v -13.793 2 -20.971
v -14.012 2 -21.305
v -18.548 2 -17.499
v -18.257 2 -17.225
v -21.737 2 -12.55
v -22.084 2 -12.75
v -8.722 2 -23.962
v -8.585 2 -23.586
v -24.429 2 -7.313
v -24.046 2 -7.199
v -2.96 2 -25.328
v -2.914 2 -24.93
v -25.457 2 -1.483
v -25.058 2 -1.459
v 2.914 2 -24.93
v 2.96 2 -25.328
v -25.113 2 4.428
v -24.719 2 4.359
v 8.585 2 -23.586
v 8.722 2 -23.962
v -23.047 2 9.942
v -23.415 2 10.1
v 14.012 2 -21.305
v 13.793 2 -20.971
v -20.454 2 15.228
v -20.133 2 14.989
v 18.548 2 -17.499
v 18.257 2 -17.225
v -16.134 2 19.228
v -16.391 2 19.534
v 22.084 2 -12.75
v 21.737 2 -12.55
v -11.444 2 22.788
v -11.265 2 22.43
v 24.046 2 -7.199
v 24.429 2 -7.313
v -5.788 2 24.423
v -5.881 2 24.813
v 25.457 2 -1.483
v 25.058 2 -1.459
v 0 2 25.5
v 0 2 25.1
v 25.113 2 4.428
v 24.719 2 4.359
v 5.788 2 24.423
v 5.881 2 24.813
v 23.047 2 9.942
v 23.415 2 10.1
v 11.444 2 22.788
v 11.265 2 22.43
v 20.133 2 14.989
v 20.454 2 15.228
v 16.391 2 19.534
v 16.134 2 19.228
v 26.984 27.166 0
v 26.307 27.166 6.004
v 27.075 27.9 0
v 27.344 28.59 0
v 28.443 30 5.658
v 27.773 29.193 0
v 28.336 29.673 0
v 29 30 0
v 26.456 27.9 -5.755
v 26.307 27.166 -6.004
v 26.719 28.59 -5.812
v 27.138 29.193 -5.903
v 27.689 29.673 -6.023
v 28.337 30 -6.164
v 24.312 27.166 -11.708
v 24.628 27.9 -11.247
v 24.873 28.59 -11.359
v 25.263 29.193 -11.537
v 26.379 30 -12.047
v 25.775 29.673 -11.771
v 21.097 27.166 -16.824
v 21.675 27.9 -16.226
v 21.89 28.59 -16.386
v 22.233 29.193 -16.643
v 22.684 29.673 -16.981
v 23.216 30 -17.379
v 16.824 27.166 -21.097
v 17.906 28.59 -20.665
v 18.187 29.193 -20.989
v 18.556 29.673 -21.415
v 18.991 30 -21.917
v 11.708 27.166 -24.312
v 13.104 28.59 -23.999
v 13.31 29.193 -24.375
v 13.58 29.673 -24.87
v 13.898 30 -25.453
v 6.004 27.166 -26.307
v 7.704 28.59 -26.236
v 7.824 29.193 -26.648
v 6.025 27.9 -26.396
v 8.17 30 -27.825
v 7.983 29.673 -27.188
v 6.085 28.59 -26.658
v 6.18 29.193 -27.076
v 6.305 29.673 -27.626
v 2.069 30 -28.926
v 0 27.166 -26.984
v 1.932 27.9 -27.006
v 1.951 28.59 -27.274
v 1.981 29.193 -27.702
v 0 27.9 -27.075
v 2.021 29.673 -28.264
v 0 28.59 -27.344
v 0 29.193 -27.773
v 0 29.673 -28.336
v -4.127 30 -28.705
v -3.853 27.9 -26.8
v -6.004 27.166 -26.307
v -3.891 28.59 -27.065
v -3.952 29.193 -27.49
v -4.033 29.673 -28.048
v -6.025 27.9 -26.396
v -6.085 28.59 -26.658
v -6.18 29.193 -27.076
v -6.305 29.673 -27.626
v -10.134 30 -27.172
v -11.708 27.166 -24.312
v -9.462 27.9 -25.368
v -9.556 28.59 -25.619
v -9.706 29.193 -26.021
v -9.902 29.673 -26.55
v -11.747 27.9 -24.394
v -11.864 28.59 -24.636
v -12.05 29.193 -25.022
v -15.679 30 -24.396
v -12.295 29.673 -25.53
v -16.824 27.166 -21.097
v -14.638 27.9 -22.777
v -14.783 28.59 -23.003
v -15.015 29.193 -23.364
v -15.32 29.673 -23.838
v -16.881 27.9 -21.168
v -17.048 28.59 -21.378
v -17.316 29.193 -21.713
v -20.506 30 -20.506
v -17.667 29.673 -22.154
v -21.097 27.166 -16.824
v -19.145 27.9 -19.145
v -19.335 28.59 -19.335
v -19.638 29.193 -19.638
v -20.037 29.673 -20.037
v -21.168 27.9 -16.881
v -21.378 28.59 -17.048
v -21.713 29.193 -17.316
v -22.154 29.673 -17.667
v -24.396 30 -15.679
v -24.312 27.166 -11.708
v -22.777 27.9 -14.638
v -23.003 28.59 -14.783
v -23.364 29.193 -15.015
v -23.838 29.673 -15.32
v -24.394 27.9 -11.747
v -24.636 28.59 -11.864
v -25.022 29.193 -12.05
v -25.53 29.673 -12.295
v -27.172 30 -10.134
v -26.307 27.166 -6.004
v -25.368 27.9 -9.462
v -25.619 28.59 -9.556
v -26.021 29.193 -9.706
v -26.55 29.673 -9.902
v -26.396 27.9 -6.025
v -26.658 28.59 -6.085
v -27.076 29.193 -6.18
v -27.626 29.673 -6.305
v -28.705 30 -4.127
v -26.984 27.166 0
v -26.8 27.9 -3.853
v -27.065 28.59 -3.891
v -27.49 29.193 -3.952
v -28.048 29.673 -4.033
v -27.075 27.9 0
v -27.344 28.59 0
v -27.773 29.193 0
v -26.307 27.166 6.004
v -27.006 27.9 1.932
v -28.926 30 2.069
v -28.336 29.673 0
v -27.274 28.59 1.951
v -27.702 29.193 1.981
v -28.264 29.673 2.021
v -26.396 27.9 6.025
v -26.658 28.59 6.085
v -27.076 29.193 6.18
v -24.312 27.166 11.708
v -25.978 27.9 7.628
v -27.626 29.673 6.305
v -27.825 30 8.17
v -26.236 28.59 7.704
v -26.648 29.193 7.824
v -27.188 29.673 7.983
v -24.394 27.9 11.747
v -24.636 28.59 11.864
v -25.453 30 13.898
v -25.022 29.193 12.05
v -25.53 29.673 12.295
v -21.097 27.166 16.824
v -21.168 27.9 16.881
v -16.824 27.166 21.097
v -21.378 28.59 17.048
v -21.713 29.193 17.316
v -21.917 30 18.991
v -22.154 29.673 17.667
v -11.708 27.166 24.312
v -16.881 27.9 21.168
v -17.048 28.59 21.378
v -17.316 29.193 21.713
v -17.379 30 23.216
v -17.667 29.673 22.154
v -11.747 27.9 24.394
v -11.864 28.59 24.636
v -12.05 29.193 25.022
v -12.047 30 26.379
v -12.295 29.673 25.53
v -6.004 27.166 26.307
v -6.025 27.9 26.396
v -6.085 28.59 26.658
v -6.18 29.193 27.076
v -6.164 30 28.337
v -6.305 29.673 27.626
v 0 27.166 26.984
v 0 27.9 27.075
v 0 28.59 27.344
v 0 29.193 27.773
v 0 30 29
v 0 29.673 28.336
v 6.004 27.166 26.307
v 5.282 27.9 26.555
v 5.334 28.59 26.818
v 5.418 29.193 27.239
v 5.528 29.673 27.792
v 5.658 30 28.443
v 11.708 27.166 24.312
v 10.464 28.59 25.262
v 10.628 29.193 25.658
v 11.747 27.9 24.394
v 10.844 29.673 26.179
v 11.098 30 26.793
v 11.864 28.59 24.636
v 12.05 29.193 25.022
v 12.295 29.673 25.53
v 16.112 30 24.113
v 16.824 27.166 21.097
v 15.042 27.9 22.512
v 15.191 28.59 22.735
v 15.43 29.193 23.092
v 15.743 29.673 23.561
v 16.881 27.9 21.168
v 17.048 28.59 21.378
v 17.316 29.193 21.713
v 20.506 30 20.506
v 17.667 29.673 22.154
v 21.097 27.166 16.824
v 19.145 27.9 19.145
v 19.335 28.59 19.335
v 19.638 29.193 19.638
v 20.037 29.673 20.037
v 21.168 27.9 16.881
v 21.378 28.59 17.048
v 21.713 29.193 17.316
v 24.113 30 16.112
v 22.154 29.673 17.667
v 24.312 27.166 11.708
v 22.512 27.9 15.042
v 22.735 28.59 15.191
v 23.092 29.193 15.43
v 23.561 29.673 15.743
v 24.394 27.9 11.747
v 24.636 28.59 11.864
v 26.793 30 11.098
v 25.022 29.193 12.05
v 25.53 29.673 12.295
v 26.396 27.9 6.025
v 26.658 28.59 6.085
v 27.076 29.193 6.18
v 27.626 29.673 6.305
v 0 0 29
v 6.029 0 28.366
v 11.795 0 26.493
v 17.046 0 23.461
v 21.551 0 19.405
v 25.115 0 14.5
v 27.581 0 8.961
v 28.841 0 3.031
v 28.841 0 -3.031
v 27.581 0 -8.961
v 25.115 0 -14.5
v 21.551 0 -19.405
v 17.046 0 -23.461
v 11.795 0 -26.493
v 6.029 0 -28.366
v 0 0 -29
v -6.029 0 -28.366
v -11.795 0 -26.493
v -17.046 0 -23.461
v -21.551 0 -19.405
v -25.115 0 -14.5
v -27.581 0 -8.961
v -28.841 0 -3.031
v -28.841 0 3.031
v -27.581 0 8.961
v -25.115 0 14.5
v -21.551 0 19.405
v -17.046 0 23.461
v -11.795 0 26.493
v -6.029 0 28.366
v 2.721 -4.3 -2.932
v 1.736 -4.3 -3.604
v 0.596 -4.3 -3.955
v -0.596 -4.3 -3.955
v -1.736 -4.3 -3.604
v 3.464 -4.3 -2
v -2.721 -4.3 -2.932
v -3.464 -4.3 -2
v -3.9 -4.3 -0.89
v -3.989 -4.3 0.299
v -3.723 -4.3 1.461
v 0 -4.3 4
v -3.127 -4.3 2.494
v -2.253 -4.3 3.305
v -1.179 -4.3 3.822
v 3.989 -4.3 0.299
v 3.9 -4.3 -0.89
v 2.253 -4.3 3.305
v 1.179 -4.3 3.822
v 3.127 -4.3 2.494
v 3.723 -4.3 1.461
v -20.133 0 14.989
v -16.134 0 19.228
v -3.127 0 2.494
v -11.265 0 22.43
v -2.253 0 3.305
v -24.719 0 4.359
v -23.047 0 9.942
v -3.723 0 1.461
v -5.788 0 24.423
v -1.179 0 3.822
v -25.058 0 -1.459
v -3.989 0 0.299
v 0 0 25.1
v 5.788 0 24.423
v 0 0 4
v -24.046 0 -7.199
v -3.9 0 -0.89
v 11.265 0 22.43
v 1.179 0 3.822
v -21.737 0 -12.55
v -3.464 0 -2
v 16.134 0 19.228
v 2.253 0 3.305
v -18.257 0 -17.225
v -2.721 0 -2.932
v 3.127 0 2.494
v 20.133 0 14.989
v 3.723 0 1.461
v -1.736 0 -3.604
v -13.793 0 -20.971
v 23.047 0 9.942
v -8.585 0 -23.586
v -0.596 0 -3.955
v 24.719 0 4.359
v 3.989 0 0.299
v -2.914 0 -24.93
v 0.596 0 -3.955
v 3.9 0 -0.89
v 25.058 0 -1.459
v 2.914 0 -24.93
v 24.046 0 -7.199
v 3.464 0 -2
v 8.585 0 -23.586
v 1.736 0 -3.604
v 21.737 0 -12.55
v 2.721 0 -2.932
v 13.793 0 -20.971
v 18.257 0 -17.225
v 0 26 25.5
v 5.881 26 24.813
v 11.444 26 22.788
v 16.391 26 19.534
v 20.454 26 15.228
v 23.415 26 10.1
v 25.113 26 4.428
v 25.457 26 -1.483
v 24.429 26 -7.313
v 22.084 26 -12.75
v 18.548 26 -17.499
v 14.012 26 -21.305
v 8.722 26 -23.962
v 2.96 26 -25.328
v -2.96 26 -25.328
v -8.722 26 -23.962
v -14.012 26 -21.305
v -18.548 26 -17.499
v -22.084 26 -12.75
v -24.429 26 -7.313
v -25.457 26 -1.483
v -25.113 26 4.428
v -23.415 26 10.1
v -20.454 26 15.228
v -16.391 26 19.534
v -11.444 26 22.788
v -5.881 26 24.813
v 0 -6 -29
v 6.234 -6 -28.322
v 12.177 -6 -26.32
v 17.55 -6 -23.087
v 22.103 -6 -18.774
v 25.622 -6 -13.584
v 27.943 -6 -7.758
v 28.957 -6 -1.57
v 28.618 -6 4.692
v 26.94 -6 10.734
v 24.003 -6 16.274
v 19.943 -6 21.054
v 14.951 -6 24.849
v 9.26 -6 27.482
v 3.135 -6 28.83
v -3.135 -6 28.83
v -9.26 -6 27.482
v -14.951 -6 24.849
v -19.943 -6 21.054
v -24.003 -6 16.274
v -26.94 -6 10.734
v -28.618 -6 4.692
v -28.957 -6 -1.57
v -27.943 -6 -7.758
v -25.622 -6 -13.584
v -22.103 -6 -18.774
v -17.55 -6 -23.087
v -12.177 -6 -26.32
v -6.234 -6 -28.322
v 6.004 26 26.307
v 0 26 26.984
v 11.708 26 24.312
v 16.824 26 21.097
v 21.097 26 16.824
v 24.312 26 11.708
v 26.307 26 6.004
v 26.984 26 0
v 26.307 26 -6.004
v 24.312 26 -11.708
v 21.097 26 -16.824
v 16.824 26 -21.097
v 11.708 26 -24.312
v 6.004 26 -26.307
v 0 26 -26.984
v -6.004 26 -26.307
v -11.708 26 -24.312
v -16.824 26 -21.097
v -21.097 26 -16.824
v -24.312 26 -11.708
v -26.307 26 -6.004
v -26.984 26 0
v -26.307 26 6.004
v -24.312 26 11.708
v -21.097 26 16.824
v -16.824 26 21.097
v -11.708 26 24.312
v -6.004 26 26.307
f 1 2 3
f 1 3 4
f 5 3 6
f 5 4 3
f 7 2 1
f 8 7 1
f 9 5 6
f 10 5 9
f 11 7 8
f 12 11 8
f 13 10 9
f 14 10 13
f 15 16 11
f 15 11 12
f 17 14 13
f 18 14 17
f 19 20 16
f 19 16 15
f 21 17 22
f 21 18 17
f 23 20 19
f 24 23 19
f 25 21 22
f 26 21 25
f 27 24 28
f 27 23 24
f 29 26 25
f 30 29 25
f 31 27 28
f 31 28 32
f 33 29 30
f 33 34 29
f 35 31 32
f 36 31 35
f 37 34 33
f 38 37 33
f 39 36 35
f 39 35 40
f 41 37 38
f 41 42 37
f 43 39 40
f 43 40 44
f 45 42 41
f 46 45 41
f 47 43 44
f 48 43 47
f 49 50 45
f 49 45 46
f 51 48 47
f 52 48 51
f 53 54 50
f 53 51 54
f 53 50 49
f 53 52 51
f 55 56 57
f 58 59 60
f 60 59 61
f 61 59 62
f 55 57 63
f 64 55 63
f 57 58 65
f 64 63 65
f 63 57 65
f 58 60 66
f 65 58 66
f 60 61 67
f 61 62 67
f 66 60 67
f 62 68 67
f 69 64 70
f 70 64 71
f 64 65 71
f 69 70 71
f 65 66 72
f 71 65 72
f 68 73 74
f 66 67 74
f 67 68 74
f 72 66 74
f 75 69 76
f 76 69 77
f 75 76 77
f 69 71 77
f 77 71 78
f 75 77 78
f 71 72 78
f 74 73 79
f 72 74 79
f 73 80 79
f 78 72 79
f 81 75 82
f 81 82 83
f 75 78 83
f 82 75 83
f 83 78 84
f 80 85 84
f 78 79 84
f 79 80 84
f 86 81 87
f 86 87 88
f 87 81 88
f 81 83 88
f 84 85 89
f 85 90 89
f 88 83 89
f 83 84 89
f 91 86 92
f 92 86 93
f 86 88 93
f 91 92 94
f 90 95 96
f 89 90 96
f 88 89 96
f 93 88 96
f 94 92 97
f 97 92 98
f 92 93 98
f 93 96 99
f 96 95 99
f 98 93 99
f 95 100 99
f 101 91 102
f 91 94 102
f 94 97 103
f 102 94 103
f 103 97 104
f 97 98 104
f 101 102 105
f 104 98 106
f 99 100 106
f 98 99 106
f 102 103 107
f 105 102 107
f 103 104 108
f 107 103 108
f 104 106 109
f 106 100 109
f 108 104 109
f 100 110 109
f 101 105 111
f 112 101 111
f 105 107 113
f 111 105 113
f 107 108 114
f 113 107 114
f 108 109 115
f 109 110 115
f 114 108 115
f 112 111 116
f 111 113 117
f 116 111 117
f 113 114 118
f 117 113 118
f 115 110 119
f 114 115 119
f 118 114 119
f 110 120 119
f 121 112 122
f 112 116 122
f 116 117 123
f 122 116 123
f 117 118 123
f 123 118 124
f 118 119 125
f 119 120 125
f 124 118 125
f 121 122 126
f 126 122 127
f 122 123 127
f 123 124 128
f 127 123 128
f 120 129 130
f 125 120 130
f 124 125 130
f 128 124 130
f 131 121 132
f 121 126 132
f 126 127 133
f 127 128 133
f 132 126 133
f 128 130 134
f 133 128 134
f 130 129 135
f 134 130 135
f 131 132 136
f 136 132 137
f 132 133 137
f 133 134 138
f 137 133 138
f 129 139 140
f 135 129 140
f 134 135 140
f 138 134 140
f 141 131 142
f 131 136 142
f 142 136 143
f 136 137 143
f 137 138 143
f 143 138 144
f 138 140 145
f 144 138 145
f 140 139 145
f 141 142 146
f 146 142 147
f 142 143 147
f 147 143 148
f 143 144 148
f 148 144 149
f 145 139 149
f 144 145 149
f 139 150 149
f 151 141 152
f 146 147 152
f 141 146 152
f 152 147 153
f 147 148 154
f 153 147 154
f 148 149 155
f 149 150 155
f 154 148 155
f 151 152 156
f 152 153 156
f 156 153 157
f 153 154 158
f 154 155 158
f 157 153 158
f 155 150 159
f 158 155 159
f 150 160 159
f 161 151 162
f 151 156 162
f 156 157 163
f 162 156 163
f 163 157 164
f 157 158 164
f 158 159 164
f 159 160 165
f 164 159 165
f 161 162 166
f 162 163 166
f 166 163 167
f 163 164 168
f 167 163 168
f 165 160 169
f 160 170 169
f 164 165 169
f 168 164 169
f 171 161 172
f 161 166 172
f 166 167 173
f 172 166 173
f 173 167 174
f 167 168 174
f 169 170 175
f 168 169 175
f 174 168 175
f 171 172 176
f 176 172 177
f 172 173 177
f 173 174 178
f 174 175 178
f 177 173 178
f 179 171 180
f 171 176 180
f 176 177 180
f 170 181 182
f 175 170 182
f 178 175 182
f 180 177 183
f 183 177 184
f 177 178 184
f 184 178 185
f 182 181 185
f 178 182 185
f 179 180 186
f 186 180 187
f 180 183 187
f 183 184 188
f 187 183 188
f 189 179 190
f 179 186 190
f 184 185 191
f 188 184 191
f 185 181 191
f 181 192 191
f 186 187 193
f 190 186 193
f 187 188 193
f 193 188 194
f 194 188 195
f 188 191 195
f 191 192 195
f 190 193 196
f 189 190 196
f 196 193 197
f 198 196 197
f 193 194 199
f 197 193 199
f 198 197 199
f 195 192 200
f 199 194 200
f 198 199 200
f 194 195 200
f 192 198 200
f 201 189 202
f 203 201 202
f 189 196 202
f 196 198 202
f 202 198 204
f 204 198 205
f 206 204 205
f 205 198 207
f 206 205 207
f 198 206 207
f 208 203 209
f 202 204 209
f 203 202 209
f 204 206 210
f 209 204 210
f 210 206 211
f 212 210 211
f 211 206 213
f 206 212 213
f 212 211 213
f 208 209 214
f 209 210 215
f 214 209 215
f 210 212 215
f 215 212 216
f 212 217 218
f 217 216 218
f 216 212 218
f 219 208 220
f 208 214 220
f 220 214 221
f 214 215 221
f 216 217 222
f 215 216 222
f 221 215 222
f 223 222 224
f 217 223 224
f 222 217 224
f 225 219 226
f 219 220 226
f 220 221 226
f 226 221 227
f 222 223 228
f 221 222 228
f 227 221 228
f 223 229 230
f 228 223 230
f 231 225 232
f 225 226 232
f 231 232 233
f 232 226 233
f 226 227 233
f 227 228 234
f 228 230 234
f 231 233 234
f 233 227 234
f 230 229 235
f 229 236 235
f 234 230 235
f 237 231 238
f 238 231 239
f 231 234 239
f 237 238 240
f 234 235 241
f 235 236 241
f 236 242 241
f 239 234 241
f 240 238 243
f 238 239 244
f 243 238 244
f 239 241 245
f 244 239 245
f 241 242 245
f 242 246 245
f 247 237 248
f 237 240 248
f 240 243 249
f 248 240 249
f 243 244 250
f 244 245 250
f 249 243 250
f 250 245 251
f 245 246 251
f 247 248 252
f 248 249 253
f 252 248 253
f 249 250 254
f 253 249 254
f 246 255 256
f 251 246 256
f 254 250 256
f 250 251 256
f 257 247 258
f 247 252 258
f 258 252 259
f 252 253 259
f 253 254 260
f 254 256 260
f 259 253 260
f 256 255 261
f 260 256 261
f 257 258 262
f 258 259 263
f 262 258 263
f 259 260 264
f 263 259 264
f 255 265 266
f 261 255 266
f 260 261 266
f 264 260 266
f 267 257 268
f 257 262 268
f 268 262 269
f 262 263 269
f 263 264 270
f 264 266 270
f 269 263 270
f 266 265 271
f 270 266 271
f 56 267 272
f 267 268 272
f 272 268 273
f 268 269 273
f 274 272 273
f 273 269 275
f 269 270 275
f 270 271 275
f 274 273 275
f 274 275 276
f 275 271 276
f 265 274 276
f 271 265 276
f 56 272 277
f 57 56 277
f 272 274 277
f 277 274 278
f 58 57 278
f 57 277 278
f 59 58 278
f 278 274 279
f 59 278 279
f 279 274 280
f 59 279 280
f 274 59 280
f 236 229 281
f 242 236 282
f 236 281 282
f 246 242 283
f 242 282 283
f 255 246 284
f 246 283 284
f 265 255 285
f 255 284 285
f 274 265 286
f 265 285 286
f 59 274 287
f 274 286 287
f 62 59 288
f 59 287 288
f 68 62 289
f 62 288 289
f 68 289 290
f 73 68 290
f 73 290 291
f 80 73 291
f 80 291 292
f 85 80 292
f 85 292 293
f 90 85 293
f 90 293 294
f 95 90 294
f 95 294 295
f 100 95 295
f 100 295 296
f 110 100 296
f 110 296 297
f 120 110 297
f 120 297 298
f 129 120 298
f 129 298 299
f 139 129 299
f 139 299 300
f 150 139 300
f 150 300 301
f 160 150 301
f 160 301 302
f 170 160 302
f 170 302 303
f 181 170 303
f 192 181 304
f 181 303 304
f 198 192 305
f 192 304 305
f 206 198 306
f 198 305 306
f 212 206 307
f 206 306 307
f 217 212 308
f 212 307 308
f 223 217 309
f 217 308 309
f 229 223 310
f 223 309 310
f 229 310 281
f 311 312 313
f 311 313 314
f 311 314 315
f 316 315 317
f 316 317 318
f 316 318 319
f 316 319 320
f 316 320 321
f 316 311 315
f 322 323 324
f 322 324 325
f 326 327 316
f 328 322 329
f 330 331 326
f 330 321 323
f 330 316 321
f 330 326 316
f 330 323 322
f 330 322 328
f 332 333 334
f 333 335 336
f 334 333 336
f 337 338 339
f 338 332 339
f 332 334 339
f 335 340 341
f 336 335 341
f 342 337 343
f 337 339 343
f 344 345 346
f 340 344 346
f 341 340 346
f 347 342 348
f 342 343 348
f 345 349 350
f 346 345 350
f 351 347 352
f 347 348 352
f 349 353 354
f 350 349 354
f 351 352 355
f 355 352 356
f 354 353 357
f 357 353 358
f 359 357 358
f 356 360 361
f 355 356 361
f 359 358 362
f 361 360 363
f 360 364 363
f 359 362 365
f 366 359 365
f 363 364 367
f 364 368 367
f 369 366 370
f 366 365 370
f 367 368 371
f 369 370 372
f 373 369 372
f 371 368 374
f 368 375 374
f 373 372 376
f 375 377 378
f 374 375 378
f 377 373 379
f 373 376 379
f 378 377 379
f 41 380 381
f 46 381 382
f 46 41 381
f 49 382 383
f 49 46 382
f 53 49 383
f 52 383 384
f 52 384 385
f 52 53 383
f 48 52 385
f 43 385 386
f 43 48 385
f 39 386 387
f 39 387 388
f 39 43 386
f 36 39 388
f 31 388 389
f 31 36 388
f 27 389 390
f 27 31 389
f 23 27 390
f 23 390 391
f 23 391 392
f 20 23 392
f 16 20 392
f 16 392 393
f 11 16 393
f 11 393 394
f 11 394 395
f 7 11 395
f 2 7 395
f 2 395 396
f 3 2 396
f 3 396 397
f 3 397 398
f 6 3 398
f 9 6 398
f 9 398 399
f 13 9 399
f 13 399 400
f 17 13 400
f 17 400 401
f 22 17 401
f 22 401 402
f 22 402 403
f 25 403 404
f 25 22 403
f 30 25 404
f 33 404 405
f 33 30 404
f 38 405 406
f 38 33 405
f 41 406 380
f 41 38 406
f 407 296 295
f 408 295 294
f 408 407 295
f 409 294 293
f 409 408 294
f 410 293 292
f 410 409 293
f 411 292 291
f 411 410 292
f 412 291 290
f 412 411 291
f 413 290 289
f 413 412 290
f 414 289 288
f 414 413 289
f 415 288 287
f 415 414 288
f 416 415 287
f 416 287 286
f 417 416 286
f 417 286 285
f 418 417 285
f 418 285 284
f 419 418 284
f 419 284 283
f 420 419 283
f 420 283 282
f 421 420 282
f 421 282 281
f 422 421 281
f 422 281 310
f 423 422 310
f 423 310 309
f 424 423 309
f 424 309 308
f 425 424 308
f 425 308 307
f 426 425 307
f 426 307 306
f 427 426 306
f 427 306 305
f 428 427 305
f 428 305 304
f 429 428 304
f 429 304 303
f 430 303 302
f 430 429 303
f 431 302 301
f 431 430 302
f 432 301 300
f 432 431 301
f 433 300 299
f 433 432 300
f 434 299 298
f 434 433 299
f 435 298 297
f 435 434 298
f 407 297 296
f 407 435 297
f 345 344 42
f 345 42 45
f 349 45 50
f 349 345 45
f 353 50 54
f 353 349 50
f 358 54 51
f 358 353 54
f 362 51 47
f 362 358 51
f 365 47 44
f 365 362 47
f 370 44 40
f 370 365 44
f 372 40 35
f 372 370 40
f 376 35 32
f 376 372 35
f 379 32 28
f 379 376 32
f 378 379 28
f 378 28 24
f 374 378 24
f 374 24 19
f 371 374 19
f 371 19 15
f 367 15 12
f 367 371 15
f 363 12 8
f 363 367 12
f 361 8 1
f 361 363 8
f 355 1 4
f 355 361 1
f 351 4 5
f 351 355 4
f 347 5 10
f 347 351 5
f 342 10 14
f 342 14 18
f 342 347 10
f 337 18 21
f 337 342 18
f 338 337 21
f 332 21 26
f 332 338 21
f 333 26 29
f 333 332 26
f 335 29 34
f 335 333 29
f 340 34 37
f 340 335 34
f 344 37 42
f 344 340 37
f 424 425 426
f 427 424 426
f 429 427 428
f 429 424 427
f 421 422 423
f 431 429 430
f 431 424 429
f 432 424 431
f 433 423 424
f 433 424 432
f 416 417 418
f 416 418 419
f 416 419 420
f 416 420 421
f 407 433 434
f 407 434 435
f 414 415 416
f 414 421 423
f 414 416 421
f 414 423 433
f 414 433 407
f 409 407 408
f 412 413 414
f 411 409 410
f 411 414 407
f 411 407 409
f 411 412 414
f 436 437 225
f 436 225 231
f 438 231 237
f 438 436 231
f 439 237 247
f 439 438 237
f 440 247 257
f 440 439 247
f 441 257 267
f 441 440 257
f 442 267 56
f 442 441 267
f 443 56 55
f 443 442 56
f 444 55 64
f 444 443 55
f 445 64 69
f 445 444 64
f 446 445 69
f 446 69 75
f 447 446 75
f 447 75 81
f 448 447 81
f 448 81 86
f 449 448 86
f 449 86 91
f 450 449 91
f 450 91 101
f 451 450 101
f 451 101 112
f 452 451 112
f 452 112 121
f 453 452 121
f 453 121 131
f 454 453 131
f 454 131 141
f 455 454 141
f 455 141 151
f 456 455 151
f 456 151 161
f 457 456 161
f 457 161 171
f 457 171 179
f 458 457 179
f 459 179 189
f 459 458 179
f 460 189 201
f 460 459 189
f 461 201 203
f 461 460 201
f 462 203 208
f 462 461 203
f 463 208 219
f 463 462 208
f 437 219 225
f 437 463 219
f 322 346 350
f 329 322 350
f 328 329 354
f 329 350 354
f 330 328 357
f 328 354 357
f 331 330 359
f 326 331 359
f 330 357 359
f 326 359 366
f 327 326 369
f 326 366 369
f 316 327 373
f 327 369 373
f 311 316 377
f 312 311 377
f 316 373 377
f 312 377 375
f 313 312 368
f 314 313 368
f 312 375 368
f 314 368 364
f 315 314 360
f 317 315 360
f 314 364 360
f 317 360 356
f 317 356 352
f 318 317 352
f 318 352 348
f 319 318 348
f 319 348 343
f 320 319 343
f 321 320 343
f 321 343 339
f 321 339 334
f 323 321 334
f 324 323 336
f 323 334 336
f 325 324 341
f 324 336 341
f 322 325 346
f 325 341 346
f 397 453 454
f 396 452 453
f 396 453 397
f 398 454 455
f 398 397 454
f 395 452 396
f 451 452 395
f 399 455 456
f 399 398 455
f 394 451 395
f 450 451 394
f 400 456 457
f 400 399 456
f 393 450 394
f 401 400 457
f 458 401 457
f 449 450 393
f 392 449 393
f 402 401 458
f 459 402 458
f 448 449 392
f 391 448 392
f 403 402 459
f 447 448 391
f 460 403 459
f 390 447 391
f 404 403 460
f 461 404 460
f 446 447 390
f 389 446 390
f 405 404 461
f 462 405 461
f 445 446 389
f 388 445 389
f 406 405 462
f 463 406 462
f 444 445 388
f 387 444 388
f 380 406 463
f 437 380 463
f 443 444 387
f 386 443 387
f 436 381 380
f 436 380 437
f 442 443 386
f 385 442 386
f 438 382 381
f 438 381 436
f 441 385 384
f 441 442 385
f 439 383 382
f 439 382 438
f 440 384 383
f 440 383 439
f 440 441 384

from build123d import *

# Parameters (mm, degrees)
SKETCH1_R           = 29
SKETCH1_R_2         = 25.5
BOSS_EXTRUDE1_DEPTH = 30
CUT_EXTRUDE1_START  = -4
SKETCH2_R           = 26.983908251
SKETCH2_R_2         = 25.5
CUT_EXTRUDE1_DEPTH  = 4
BOSS_EXTRUDE2_START = 6
SKETCH3_R           = 29
BOSS_EXTRUDE2_DEPTH = 6
SKETCH4_R           = 4
CUT_EXTRUDE2_DEPTH  = 4.3
SKETCH5_R           = 25.5
SKETCH5_R_2         = 25.1
BOSS_EXTRUDE3_DEPTH = 2


with BuildPart() as part:
    # Sketch1 → Boss-Extrude1 (new body)
    with BuildSketch(Plane(origin=(0, 0, 0), x_dir=(1, 0, 0), z_dir=(0, 1, 0))):
        with Locations(Location((0, 0, 0), (0, 0, 270))):
            Circle(SKETCH1_R)
        with Locations(Location((0, 0, 0), (0, 0, 270))):
            Circle(SKETCH1_R_2, mode=Mode.SUBTRACT)
    extrude(amount=BOSS_EXTRUDE1_DEPTH)

    # Sketch2 → Cut-Extrude1 (cut)
    with BuildSketch(Plane(origin=(0, 30, 0), x_dir=(1, 0, 0), z_dir=(0, 1, 0)).offset(CUT_EXTRUDE1_START)):
        with Locations(Location((0, 0, 0), (0, 0, 270))):
            Circle(SKETCH2_R)
        with Locations(Location((0, 0, 0), (0, 0, 270))):
            Circle(SKETCH2_R_2, mode=Mode.SUBTRACT)
    extrude(amount=CUT_EXTRUDE1_DEPTH, mode=Mode.SUBTRACT)

    # Fillet1: read off the stored shape, not the designer's step
    # Fillet1 outline → Fillet1 (revolve, cut)
    with BuildSketch(Plane.XY):
        with BuildLine():
            ThreePointArc((26.983908251, 27.165934977), (27.539350545, 28.904939757), (29, 30))
            Line((29, 30), (26.983908251, 30))
            Line((26.983908251, 30), (26.983908251, 27.165934977))
        make_face()
    revolve(axis=Axis((0, 0, 0), (0, 1, 0)), mode=Mode.SUBTRACT)

    # Sketch3 → Boss-Extrude2 (add)
    with BuildSketch(Plane.XZ.offset(BOSS_EXTRUDE2_START)):
        with Locations(Location((0, 0, 0), (0, 0, 270))):
            Circle(SKETCH3_R)
    extrude(amount=-BOSS_EXTRUDE2_DEPTH)

    # Sketch4 → Cut-Extrude2 (cut)
    with BuildSketch(Plane(origin=(0, 0, 0), x_dir=(1, 0, 0), z_dir=(0, 1, 0))):
        with Locations(Location((0, 0, 0), (0, 0, 270))):
            Circle(SKETCH4_R)
    extrude(amount=-CUT_EXTRUDE2_DEPTH, mode=Mode.SUBTRACT)

    # Sketch5 → Boss-Extrude3 (add)
    with BuildSketch(Plane(origin=(0, 0, 0), x_dir=(1, 0, 0), z_dir=(0, 1, 0))):
        with Locations(Location((0, 0, 0), (0, 0, 270))):
            Circle(SKETCH5_R)
        with Locations(Location((0, 0, 0), (0, 0, 270))):
            Circle(SKETCH5_R_2, mode=Mode.SUBTRACT)
    extrude(amount=BOSS_EXTRUDE3_DEPTH)


solid = part.part
